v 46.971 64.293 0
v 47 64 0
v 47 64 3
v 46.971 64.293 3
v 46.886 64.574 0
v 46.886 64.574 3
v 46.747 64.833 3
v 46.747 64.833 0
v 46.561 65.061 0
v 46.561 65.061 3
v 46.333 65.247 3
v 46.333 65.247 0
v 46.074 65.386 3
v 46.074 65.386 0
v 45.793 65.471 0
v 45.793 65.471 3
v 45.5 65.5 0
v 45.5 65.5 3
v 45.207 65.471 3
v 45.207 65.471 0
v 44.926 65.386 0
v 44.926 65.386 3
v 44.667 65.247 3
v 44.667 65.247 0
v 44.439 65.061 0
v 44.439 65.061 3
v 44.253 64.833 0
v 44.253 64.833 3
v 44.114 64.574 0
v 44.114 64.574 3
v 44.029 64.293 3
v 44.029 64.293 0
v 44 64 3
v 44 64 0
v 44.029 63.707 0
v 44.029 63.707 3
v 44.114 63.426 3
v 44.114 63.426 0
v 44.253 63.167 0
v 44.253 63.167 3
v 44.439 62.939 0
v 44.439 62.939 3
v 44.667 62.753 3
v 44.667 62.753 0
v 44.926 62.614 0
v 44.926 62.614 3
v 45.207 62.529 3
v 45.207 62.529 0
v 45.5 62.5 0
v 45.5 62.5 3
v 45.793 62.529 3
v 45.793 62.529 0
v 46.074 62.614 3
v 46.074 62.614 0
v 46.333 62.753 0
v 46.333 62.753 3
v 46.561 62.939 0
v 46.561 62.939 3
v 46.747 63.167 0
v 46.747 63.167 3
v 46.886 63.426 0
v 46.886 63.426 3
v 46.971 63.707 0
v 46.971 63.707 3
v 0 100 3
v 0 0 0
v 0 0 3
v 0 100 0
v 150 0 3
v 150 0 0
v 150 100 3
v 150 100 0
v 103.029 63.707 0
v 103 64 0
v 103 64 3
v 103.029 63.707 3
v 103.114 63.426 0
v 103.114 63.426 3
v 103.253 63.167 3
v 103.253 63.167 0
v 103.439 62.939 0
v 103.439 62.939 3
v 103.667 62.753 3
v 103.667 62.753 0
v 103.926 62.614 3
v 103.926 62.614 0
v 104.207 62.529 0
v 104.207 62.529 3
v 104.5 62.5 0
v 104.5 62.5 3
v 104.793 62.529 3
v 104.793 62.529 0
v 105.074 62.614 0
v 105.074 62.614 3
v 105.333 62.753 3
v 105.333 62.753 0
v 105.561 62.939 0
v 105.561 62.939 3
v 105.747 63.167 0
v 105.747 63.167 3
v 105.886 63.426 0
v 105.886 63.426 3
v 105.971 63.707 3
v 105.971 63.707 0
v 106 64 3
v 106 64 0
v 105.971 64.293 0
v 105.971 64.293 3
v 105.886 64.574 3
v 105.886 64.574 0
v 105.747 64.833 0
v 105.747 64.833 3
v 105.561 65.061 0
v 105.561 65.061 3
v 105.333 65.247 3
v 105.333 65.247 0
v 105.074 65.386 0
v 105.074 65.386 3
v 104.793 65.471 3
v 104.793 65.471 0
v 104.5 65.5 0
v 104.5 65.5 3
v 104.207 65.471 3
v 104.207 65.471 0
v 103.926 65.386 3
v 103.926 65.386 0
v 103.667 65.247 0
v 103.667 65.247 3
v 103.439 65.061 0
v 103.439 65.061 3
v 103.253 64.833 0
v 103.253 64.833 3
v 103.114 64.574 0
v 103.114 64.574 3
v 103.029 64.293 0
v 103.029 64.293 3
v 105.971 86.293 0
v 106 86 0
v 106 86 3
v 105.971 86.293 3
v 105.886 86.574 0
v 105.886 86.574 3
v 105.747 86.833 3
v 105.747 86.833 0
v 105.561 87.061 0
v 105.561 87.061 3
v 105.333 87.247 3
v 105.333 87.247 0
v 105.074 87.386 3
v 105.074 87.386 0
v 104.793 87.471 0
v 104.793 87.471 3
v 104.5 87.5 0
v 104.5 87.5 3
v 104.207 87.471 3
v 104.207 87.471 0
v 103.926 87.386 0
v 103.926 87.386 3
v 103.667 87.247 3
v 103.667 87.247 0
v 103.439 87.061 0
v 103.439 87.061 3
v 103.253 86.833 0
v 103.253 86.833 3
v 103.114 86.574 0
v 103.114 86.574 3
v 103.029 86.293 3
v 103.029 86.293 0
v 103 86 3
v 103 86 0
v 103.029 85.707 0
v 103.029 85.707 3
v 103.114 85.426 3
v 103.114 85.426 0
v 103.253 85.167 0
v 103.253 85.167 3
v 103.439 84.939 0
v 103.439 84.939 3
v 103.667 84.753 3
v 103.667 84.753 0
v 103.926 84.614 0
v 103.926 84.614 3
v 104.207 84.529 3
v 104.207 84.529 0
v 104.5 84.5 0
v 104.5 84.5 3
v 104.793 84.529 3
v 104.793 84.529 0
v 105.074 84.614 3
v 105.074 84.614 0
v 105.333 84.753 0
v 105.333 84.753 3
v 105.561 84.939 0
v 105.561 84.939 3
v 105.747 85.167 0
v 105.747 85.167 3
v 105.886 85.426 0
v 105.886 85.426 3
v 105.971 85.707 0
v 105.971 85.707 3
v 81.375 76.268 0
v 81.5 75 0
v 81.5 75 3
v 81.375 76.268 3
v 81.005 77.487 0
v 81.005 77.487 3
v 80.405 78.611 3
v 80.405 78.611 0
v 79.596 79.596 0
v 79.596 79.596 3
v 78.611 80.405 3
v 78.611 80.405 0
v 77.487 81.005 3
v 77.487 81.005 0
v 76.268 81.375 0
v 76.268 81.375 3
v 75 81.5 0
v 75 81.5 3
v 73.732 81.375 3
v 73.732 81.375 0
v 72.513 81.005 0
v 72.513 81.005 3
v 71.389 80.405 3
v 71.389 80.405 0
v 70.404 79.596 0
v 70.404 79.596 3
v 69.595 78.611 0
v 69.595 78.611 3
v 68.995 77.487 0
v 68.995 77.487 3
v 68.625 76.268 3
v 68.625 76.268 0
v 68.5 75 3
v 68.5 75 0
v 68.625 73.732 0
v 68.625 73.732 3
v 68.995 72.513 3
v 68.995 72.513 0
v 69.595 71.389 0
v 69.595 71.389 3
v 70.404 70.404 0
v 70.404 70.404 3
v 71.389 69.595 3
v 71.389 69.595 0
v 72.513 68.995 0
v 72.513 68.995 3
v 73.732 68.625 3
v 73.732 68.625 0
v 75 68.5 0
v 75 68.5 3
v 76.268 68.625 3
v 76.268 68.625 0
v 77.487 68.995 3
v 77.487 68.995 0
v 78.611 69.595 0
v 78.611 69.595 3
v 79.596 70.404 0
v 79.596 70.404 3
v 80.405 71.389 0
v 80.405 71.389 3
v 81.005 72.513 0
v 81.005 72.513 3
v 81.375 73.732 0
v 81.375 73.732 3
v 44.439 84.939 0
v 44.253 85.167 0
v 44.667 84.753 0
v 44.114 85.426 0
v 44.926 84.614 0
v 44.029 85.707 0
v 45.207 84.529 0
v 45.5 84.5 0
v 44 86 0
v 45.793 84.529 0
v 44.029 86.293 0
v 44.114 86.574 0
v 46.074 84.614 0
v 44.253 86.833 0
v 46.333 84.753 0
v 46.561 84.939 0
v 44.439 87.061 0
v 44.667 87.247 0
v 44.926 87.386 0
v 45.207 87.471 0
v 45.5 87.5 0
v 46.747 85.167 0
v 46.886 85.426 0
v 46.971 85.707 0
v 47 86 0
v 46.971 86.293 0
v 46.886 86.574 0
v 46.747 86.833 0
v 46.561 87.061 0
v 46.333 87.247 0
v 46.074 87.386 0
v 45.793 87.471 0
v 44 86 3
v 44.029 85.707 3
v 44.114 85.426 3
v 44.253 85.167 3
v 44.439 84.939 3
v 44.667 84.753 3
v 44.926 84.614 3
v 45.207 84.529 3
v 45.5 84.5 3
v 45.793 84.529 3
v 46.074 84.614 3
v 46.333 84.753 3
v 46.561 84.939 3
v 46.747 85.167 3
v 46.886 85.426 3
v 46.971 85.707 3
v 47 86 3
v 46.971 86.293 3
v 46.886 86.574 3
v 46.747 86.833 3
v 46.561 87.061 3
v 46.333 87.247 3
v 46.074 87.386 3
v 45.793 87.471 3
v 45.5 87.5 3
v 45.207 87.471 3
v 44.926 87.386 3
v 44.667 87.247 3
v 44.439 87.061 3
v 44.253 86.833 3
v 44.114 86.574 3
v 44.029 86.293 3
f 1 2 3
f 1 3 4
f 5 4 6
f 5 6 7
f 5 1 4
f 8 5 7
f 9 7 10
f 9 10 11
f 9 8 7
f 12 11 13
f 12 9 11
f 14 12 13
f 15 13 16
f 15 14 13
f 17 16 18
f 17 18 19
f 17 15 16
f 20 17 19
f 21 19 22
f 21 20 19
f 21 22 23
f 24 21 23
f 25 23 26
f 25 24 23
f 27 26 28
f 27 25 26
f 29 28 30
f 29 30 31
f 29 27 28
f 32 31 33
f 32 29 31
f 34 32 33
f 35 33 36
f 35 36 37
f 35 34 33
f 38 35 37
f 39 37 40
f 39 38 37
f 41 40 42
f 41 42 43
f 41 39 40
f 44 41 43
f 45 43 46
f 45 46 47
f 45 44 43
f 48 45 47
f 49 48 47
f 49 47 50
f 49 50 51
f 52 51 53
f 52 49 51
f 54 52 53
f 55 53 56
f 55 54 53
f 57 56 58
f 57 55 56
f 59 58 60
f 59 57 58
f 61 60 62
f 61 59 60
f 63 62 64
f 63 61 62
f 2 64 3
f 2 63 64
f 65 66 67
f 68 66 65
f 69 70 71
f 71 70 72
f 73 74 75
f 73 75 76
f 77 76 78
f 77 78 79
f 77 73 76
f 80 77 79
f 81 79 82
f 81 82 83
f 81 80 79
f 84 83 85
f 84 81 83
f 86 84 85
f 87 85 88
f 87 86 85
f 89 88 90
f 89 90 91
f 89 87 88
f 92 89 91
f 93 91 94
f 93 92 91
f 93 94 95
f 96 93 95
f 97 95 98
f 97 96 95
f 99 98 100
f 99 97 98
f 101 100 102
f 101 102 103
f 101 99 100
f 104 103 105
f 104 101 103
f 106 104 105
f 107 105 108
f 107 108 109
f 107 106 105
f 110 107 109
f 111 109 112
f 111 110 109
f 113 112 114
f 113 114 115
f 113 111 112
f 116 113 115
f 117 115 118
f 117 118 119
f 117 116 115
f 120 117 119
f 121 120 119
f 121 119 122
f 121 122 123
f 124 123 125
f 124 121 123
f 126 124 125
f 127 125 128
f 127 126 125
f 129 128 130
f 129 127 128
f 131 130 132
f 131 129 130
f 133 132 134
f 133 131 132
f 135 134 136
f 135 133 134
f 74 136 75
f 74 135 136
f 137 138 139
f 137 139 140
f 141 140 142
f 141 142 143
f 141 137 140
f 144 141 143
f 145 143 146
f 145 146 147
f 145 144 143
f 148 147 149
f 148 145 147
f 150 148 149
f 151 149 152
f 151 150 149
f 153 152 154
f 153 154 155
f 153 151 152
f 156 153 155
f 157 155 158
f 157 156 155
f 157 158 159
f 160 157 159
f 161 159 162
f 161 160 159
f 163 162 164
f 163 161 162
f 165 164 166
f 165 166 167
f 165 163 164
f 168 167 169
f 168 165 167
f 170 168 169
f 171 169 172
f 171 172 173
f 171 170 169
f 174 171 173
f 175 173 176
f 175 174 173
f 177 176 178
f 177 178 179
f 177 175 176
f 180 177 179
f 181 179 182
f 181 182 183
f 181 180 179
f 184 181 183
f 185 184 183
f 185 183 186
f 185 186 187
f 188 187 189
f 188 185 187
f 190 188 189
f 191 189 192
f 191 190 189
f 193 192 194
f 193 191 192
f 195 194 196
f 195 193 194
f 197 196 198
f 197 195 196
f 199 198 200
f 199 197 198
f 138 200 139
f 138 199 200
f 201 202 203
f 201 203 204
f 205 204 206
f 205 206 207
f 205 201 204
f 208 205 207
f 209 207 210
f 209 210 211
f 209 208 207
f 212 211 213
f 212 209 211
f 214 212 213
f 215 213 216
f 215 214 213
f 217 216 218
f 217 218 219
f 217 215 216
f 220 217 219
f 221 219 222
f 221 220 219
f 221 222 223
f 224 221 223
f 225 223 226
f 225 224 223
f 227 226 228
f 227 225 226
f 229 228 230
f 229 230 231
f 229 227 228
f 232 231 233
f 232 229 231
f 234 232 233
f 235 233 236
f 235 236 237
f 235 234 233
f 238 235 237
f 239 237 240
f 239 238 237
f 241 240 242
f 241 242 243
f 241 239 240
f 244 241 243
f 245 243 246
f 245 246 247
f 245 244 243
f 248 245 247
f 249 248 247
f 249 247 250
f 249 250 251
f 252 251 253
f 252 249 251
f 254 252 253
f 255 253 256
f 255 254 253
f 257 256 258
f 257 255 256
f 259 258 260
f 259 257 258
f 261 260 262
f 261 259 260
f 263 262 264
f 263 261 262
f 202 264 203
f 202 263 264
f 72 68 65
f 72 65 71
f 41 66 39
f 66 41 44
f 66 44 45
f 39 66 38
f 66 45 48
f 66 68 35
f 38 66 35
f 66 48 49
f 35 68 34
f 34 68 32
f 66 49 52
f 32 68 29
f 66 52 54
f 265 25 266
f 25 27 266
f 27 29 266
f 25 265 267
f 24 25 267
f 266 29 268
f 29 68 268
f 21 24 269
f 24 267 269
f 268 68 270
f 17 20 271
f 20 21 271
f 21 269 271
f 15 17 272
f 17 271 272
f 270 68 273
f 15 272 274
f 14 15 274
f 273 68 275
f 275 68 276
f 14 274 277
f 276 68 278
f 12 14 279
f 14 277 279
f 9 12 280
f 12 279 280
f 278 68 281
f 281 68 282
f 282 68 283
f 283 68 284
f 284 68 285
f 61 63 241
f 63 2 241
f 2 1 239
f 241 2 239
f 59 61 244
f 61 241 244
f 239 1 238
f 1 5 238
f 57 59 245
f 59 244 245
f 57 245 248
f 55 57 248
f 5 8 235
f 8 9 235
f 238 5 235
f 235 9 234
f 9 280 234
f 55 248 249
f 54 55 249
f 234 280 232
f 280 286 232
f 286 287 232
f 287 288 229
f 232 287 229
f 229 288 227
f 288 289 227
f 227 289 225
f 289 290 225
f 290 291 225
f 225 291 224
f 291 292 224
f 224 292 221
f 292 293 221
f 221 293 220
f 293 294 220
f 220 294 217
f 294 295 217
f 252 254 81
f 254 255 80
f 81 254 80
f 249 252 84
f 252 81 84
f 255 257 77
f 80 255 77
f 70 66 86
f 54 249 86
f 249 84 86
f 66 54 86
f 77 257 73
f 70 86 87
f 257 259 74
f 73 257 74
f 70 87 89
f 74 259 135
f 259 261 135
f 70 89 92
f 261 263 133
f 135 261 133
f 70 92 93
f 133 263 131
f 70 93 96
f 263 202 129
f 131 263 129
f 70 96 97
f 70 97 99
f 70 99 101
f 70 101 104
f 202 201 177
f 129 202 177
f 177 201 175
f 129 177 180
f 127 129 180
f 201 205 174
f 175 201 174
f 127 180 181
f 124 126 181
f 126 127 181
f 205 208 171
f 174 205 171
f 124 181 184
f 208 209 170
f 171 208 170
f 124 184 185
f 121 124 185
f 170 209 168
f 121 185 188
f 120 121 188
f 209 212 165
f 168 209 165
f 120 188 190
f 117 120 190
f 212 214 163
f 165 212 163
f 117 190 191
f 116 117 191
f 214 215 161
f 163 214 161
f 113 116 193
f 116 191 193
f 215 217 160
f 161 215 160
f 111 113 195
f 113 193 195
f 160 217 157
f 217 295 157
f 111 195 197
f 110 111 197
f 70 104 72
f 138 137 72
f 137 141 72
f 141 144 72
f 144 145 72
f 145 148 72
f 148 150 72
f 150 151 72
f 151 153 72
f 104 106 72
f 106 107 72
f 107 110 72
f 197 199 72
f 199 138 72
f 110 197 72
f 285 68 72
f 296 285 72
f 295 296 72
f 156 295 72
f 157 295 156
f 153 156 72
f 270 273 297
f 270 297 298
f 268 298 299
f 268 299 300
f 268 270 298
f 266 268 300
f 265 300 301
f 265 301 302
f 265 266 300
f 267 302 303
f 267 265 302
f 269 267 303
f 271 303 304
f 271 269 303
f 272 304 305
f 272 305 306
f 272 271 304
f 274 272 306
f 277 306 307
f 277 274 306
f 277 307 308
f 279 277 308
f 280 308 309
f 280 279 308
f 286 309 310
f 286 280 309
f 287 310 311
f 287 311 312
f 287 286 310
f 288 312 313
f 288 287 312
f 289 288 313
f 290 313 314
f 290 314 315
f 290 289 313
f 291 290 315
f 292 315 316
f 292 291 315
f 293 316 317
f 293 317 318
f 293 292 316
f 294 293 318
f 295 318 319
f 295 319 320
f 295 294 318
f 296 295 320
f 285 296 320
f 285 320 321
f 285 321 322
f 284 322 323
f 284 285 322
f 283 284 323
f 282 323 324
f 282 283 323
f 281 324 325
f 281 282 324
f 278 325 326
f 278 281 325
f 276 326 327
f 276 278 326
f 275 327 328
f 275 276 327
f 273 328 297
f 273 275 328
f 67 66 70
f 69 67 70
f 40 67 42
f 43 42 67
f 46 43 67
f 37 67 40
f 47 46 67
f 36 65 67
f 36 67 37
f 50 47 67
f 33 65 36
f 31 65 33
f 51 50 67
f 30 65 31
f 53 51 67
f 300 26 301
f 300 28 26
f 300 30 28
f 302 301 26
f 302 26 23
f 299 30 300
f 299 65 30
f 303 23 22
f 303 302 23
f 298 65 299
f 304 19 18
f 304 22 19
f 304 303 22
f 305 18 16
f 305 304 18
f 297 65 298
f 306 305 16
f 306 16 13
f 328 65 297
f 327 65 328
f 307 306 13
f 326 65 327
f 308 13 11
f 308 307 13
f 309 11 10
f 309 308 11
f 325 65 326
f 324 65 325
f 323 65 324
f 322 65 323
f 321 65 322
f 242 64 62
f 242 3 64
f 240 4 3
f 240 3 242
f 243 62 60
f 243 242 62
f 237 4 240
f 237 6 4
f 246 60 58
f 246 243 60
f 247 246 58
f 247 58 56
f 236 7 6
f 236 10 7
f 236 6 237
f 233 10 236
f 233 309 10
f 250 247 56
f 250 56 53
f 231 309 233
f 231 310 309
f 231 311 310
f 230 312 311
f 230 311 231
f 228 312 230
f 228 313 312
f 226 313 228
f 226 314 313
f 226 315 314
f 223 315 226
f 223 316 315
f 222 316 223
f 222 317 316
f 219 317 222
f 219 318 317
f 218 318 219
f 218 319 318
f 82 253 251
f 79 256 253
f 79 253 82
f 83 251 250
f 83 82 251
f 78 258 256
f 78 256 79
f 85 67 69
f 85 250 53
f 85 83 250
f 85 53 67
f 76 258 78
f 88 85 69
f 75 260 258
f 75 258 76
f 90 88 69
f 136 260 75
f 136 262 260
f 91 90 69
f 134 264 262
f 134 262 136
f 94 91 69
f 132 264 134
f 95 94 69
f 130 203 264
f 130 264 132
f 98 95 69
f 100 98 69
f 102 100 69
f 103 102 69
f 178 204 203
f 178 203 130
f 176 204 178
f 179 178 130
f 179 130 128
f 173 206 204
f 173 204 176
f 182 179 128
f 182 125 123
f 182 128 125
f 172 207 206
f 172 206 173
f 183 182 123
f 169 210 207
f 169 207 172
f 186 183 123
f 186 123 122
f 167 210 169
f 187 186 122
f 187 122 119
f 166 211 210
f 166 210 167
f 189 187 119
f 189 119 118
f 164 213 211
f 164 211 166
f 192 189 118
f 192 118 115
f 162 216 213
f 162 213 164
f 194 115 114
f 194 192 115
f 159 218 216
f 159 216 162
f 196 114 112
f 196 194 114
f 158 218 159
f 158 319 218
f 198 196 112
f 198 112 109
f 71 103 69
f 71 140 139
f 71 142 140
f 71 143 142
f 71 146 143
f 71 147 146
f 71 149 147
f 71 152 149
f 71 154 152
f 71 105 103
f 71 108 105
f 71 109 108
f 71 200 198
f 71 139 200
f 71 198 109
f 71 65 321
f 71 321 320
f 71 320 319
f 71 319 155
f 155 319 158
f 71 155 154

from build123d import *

# Parameters (mm, degrees)
ESBO_O1_W                = 150
ESBO_O1_H                = 100
ESBO_O1_R                = 6.5
ESBO_O1_R_2              = 1.5
RESSALTO_EXTRUS_O1_DEPTH = 3


with BuildPart() as part:
    # Esboço1 → Ressalto-extrusão1 (new body)
    with BuildSketch(Plane.XY):
        with Locations((75, 50)):
            Rectangle(ESBO_O1_W, ESBO_O1_H)
        with Locations((75, 75)):
            Circle(ESBO_O1_R, mode=Mode.SUBTRACT)
        with Locations((104.5, 86)):
            Circle(ESBO_O1_R_2, mode=Mode.SUBTRACT)
        with Locations(Location((104.5, 64, 0), (0, 0, 180))):
            Circle(ESBO_O1_R_2, mode=Mode.SUBTRACT)
        with Locations((45.5, 64)):
            Circle(ESBO_O1_R_2, mode=Mode.SUBTRACT)
        with Locations(Location((45.5, 86, 0), (0, 0, 180))):
            Circle(ESBO_O1_R_2, mode=Mode.SUBTRACT)
    extrude(amount=RESSALTO_EXTRUS_O1_DEPTH)


solid = part.part
